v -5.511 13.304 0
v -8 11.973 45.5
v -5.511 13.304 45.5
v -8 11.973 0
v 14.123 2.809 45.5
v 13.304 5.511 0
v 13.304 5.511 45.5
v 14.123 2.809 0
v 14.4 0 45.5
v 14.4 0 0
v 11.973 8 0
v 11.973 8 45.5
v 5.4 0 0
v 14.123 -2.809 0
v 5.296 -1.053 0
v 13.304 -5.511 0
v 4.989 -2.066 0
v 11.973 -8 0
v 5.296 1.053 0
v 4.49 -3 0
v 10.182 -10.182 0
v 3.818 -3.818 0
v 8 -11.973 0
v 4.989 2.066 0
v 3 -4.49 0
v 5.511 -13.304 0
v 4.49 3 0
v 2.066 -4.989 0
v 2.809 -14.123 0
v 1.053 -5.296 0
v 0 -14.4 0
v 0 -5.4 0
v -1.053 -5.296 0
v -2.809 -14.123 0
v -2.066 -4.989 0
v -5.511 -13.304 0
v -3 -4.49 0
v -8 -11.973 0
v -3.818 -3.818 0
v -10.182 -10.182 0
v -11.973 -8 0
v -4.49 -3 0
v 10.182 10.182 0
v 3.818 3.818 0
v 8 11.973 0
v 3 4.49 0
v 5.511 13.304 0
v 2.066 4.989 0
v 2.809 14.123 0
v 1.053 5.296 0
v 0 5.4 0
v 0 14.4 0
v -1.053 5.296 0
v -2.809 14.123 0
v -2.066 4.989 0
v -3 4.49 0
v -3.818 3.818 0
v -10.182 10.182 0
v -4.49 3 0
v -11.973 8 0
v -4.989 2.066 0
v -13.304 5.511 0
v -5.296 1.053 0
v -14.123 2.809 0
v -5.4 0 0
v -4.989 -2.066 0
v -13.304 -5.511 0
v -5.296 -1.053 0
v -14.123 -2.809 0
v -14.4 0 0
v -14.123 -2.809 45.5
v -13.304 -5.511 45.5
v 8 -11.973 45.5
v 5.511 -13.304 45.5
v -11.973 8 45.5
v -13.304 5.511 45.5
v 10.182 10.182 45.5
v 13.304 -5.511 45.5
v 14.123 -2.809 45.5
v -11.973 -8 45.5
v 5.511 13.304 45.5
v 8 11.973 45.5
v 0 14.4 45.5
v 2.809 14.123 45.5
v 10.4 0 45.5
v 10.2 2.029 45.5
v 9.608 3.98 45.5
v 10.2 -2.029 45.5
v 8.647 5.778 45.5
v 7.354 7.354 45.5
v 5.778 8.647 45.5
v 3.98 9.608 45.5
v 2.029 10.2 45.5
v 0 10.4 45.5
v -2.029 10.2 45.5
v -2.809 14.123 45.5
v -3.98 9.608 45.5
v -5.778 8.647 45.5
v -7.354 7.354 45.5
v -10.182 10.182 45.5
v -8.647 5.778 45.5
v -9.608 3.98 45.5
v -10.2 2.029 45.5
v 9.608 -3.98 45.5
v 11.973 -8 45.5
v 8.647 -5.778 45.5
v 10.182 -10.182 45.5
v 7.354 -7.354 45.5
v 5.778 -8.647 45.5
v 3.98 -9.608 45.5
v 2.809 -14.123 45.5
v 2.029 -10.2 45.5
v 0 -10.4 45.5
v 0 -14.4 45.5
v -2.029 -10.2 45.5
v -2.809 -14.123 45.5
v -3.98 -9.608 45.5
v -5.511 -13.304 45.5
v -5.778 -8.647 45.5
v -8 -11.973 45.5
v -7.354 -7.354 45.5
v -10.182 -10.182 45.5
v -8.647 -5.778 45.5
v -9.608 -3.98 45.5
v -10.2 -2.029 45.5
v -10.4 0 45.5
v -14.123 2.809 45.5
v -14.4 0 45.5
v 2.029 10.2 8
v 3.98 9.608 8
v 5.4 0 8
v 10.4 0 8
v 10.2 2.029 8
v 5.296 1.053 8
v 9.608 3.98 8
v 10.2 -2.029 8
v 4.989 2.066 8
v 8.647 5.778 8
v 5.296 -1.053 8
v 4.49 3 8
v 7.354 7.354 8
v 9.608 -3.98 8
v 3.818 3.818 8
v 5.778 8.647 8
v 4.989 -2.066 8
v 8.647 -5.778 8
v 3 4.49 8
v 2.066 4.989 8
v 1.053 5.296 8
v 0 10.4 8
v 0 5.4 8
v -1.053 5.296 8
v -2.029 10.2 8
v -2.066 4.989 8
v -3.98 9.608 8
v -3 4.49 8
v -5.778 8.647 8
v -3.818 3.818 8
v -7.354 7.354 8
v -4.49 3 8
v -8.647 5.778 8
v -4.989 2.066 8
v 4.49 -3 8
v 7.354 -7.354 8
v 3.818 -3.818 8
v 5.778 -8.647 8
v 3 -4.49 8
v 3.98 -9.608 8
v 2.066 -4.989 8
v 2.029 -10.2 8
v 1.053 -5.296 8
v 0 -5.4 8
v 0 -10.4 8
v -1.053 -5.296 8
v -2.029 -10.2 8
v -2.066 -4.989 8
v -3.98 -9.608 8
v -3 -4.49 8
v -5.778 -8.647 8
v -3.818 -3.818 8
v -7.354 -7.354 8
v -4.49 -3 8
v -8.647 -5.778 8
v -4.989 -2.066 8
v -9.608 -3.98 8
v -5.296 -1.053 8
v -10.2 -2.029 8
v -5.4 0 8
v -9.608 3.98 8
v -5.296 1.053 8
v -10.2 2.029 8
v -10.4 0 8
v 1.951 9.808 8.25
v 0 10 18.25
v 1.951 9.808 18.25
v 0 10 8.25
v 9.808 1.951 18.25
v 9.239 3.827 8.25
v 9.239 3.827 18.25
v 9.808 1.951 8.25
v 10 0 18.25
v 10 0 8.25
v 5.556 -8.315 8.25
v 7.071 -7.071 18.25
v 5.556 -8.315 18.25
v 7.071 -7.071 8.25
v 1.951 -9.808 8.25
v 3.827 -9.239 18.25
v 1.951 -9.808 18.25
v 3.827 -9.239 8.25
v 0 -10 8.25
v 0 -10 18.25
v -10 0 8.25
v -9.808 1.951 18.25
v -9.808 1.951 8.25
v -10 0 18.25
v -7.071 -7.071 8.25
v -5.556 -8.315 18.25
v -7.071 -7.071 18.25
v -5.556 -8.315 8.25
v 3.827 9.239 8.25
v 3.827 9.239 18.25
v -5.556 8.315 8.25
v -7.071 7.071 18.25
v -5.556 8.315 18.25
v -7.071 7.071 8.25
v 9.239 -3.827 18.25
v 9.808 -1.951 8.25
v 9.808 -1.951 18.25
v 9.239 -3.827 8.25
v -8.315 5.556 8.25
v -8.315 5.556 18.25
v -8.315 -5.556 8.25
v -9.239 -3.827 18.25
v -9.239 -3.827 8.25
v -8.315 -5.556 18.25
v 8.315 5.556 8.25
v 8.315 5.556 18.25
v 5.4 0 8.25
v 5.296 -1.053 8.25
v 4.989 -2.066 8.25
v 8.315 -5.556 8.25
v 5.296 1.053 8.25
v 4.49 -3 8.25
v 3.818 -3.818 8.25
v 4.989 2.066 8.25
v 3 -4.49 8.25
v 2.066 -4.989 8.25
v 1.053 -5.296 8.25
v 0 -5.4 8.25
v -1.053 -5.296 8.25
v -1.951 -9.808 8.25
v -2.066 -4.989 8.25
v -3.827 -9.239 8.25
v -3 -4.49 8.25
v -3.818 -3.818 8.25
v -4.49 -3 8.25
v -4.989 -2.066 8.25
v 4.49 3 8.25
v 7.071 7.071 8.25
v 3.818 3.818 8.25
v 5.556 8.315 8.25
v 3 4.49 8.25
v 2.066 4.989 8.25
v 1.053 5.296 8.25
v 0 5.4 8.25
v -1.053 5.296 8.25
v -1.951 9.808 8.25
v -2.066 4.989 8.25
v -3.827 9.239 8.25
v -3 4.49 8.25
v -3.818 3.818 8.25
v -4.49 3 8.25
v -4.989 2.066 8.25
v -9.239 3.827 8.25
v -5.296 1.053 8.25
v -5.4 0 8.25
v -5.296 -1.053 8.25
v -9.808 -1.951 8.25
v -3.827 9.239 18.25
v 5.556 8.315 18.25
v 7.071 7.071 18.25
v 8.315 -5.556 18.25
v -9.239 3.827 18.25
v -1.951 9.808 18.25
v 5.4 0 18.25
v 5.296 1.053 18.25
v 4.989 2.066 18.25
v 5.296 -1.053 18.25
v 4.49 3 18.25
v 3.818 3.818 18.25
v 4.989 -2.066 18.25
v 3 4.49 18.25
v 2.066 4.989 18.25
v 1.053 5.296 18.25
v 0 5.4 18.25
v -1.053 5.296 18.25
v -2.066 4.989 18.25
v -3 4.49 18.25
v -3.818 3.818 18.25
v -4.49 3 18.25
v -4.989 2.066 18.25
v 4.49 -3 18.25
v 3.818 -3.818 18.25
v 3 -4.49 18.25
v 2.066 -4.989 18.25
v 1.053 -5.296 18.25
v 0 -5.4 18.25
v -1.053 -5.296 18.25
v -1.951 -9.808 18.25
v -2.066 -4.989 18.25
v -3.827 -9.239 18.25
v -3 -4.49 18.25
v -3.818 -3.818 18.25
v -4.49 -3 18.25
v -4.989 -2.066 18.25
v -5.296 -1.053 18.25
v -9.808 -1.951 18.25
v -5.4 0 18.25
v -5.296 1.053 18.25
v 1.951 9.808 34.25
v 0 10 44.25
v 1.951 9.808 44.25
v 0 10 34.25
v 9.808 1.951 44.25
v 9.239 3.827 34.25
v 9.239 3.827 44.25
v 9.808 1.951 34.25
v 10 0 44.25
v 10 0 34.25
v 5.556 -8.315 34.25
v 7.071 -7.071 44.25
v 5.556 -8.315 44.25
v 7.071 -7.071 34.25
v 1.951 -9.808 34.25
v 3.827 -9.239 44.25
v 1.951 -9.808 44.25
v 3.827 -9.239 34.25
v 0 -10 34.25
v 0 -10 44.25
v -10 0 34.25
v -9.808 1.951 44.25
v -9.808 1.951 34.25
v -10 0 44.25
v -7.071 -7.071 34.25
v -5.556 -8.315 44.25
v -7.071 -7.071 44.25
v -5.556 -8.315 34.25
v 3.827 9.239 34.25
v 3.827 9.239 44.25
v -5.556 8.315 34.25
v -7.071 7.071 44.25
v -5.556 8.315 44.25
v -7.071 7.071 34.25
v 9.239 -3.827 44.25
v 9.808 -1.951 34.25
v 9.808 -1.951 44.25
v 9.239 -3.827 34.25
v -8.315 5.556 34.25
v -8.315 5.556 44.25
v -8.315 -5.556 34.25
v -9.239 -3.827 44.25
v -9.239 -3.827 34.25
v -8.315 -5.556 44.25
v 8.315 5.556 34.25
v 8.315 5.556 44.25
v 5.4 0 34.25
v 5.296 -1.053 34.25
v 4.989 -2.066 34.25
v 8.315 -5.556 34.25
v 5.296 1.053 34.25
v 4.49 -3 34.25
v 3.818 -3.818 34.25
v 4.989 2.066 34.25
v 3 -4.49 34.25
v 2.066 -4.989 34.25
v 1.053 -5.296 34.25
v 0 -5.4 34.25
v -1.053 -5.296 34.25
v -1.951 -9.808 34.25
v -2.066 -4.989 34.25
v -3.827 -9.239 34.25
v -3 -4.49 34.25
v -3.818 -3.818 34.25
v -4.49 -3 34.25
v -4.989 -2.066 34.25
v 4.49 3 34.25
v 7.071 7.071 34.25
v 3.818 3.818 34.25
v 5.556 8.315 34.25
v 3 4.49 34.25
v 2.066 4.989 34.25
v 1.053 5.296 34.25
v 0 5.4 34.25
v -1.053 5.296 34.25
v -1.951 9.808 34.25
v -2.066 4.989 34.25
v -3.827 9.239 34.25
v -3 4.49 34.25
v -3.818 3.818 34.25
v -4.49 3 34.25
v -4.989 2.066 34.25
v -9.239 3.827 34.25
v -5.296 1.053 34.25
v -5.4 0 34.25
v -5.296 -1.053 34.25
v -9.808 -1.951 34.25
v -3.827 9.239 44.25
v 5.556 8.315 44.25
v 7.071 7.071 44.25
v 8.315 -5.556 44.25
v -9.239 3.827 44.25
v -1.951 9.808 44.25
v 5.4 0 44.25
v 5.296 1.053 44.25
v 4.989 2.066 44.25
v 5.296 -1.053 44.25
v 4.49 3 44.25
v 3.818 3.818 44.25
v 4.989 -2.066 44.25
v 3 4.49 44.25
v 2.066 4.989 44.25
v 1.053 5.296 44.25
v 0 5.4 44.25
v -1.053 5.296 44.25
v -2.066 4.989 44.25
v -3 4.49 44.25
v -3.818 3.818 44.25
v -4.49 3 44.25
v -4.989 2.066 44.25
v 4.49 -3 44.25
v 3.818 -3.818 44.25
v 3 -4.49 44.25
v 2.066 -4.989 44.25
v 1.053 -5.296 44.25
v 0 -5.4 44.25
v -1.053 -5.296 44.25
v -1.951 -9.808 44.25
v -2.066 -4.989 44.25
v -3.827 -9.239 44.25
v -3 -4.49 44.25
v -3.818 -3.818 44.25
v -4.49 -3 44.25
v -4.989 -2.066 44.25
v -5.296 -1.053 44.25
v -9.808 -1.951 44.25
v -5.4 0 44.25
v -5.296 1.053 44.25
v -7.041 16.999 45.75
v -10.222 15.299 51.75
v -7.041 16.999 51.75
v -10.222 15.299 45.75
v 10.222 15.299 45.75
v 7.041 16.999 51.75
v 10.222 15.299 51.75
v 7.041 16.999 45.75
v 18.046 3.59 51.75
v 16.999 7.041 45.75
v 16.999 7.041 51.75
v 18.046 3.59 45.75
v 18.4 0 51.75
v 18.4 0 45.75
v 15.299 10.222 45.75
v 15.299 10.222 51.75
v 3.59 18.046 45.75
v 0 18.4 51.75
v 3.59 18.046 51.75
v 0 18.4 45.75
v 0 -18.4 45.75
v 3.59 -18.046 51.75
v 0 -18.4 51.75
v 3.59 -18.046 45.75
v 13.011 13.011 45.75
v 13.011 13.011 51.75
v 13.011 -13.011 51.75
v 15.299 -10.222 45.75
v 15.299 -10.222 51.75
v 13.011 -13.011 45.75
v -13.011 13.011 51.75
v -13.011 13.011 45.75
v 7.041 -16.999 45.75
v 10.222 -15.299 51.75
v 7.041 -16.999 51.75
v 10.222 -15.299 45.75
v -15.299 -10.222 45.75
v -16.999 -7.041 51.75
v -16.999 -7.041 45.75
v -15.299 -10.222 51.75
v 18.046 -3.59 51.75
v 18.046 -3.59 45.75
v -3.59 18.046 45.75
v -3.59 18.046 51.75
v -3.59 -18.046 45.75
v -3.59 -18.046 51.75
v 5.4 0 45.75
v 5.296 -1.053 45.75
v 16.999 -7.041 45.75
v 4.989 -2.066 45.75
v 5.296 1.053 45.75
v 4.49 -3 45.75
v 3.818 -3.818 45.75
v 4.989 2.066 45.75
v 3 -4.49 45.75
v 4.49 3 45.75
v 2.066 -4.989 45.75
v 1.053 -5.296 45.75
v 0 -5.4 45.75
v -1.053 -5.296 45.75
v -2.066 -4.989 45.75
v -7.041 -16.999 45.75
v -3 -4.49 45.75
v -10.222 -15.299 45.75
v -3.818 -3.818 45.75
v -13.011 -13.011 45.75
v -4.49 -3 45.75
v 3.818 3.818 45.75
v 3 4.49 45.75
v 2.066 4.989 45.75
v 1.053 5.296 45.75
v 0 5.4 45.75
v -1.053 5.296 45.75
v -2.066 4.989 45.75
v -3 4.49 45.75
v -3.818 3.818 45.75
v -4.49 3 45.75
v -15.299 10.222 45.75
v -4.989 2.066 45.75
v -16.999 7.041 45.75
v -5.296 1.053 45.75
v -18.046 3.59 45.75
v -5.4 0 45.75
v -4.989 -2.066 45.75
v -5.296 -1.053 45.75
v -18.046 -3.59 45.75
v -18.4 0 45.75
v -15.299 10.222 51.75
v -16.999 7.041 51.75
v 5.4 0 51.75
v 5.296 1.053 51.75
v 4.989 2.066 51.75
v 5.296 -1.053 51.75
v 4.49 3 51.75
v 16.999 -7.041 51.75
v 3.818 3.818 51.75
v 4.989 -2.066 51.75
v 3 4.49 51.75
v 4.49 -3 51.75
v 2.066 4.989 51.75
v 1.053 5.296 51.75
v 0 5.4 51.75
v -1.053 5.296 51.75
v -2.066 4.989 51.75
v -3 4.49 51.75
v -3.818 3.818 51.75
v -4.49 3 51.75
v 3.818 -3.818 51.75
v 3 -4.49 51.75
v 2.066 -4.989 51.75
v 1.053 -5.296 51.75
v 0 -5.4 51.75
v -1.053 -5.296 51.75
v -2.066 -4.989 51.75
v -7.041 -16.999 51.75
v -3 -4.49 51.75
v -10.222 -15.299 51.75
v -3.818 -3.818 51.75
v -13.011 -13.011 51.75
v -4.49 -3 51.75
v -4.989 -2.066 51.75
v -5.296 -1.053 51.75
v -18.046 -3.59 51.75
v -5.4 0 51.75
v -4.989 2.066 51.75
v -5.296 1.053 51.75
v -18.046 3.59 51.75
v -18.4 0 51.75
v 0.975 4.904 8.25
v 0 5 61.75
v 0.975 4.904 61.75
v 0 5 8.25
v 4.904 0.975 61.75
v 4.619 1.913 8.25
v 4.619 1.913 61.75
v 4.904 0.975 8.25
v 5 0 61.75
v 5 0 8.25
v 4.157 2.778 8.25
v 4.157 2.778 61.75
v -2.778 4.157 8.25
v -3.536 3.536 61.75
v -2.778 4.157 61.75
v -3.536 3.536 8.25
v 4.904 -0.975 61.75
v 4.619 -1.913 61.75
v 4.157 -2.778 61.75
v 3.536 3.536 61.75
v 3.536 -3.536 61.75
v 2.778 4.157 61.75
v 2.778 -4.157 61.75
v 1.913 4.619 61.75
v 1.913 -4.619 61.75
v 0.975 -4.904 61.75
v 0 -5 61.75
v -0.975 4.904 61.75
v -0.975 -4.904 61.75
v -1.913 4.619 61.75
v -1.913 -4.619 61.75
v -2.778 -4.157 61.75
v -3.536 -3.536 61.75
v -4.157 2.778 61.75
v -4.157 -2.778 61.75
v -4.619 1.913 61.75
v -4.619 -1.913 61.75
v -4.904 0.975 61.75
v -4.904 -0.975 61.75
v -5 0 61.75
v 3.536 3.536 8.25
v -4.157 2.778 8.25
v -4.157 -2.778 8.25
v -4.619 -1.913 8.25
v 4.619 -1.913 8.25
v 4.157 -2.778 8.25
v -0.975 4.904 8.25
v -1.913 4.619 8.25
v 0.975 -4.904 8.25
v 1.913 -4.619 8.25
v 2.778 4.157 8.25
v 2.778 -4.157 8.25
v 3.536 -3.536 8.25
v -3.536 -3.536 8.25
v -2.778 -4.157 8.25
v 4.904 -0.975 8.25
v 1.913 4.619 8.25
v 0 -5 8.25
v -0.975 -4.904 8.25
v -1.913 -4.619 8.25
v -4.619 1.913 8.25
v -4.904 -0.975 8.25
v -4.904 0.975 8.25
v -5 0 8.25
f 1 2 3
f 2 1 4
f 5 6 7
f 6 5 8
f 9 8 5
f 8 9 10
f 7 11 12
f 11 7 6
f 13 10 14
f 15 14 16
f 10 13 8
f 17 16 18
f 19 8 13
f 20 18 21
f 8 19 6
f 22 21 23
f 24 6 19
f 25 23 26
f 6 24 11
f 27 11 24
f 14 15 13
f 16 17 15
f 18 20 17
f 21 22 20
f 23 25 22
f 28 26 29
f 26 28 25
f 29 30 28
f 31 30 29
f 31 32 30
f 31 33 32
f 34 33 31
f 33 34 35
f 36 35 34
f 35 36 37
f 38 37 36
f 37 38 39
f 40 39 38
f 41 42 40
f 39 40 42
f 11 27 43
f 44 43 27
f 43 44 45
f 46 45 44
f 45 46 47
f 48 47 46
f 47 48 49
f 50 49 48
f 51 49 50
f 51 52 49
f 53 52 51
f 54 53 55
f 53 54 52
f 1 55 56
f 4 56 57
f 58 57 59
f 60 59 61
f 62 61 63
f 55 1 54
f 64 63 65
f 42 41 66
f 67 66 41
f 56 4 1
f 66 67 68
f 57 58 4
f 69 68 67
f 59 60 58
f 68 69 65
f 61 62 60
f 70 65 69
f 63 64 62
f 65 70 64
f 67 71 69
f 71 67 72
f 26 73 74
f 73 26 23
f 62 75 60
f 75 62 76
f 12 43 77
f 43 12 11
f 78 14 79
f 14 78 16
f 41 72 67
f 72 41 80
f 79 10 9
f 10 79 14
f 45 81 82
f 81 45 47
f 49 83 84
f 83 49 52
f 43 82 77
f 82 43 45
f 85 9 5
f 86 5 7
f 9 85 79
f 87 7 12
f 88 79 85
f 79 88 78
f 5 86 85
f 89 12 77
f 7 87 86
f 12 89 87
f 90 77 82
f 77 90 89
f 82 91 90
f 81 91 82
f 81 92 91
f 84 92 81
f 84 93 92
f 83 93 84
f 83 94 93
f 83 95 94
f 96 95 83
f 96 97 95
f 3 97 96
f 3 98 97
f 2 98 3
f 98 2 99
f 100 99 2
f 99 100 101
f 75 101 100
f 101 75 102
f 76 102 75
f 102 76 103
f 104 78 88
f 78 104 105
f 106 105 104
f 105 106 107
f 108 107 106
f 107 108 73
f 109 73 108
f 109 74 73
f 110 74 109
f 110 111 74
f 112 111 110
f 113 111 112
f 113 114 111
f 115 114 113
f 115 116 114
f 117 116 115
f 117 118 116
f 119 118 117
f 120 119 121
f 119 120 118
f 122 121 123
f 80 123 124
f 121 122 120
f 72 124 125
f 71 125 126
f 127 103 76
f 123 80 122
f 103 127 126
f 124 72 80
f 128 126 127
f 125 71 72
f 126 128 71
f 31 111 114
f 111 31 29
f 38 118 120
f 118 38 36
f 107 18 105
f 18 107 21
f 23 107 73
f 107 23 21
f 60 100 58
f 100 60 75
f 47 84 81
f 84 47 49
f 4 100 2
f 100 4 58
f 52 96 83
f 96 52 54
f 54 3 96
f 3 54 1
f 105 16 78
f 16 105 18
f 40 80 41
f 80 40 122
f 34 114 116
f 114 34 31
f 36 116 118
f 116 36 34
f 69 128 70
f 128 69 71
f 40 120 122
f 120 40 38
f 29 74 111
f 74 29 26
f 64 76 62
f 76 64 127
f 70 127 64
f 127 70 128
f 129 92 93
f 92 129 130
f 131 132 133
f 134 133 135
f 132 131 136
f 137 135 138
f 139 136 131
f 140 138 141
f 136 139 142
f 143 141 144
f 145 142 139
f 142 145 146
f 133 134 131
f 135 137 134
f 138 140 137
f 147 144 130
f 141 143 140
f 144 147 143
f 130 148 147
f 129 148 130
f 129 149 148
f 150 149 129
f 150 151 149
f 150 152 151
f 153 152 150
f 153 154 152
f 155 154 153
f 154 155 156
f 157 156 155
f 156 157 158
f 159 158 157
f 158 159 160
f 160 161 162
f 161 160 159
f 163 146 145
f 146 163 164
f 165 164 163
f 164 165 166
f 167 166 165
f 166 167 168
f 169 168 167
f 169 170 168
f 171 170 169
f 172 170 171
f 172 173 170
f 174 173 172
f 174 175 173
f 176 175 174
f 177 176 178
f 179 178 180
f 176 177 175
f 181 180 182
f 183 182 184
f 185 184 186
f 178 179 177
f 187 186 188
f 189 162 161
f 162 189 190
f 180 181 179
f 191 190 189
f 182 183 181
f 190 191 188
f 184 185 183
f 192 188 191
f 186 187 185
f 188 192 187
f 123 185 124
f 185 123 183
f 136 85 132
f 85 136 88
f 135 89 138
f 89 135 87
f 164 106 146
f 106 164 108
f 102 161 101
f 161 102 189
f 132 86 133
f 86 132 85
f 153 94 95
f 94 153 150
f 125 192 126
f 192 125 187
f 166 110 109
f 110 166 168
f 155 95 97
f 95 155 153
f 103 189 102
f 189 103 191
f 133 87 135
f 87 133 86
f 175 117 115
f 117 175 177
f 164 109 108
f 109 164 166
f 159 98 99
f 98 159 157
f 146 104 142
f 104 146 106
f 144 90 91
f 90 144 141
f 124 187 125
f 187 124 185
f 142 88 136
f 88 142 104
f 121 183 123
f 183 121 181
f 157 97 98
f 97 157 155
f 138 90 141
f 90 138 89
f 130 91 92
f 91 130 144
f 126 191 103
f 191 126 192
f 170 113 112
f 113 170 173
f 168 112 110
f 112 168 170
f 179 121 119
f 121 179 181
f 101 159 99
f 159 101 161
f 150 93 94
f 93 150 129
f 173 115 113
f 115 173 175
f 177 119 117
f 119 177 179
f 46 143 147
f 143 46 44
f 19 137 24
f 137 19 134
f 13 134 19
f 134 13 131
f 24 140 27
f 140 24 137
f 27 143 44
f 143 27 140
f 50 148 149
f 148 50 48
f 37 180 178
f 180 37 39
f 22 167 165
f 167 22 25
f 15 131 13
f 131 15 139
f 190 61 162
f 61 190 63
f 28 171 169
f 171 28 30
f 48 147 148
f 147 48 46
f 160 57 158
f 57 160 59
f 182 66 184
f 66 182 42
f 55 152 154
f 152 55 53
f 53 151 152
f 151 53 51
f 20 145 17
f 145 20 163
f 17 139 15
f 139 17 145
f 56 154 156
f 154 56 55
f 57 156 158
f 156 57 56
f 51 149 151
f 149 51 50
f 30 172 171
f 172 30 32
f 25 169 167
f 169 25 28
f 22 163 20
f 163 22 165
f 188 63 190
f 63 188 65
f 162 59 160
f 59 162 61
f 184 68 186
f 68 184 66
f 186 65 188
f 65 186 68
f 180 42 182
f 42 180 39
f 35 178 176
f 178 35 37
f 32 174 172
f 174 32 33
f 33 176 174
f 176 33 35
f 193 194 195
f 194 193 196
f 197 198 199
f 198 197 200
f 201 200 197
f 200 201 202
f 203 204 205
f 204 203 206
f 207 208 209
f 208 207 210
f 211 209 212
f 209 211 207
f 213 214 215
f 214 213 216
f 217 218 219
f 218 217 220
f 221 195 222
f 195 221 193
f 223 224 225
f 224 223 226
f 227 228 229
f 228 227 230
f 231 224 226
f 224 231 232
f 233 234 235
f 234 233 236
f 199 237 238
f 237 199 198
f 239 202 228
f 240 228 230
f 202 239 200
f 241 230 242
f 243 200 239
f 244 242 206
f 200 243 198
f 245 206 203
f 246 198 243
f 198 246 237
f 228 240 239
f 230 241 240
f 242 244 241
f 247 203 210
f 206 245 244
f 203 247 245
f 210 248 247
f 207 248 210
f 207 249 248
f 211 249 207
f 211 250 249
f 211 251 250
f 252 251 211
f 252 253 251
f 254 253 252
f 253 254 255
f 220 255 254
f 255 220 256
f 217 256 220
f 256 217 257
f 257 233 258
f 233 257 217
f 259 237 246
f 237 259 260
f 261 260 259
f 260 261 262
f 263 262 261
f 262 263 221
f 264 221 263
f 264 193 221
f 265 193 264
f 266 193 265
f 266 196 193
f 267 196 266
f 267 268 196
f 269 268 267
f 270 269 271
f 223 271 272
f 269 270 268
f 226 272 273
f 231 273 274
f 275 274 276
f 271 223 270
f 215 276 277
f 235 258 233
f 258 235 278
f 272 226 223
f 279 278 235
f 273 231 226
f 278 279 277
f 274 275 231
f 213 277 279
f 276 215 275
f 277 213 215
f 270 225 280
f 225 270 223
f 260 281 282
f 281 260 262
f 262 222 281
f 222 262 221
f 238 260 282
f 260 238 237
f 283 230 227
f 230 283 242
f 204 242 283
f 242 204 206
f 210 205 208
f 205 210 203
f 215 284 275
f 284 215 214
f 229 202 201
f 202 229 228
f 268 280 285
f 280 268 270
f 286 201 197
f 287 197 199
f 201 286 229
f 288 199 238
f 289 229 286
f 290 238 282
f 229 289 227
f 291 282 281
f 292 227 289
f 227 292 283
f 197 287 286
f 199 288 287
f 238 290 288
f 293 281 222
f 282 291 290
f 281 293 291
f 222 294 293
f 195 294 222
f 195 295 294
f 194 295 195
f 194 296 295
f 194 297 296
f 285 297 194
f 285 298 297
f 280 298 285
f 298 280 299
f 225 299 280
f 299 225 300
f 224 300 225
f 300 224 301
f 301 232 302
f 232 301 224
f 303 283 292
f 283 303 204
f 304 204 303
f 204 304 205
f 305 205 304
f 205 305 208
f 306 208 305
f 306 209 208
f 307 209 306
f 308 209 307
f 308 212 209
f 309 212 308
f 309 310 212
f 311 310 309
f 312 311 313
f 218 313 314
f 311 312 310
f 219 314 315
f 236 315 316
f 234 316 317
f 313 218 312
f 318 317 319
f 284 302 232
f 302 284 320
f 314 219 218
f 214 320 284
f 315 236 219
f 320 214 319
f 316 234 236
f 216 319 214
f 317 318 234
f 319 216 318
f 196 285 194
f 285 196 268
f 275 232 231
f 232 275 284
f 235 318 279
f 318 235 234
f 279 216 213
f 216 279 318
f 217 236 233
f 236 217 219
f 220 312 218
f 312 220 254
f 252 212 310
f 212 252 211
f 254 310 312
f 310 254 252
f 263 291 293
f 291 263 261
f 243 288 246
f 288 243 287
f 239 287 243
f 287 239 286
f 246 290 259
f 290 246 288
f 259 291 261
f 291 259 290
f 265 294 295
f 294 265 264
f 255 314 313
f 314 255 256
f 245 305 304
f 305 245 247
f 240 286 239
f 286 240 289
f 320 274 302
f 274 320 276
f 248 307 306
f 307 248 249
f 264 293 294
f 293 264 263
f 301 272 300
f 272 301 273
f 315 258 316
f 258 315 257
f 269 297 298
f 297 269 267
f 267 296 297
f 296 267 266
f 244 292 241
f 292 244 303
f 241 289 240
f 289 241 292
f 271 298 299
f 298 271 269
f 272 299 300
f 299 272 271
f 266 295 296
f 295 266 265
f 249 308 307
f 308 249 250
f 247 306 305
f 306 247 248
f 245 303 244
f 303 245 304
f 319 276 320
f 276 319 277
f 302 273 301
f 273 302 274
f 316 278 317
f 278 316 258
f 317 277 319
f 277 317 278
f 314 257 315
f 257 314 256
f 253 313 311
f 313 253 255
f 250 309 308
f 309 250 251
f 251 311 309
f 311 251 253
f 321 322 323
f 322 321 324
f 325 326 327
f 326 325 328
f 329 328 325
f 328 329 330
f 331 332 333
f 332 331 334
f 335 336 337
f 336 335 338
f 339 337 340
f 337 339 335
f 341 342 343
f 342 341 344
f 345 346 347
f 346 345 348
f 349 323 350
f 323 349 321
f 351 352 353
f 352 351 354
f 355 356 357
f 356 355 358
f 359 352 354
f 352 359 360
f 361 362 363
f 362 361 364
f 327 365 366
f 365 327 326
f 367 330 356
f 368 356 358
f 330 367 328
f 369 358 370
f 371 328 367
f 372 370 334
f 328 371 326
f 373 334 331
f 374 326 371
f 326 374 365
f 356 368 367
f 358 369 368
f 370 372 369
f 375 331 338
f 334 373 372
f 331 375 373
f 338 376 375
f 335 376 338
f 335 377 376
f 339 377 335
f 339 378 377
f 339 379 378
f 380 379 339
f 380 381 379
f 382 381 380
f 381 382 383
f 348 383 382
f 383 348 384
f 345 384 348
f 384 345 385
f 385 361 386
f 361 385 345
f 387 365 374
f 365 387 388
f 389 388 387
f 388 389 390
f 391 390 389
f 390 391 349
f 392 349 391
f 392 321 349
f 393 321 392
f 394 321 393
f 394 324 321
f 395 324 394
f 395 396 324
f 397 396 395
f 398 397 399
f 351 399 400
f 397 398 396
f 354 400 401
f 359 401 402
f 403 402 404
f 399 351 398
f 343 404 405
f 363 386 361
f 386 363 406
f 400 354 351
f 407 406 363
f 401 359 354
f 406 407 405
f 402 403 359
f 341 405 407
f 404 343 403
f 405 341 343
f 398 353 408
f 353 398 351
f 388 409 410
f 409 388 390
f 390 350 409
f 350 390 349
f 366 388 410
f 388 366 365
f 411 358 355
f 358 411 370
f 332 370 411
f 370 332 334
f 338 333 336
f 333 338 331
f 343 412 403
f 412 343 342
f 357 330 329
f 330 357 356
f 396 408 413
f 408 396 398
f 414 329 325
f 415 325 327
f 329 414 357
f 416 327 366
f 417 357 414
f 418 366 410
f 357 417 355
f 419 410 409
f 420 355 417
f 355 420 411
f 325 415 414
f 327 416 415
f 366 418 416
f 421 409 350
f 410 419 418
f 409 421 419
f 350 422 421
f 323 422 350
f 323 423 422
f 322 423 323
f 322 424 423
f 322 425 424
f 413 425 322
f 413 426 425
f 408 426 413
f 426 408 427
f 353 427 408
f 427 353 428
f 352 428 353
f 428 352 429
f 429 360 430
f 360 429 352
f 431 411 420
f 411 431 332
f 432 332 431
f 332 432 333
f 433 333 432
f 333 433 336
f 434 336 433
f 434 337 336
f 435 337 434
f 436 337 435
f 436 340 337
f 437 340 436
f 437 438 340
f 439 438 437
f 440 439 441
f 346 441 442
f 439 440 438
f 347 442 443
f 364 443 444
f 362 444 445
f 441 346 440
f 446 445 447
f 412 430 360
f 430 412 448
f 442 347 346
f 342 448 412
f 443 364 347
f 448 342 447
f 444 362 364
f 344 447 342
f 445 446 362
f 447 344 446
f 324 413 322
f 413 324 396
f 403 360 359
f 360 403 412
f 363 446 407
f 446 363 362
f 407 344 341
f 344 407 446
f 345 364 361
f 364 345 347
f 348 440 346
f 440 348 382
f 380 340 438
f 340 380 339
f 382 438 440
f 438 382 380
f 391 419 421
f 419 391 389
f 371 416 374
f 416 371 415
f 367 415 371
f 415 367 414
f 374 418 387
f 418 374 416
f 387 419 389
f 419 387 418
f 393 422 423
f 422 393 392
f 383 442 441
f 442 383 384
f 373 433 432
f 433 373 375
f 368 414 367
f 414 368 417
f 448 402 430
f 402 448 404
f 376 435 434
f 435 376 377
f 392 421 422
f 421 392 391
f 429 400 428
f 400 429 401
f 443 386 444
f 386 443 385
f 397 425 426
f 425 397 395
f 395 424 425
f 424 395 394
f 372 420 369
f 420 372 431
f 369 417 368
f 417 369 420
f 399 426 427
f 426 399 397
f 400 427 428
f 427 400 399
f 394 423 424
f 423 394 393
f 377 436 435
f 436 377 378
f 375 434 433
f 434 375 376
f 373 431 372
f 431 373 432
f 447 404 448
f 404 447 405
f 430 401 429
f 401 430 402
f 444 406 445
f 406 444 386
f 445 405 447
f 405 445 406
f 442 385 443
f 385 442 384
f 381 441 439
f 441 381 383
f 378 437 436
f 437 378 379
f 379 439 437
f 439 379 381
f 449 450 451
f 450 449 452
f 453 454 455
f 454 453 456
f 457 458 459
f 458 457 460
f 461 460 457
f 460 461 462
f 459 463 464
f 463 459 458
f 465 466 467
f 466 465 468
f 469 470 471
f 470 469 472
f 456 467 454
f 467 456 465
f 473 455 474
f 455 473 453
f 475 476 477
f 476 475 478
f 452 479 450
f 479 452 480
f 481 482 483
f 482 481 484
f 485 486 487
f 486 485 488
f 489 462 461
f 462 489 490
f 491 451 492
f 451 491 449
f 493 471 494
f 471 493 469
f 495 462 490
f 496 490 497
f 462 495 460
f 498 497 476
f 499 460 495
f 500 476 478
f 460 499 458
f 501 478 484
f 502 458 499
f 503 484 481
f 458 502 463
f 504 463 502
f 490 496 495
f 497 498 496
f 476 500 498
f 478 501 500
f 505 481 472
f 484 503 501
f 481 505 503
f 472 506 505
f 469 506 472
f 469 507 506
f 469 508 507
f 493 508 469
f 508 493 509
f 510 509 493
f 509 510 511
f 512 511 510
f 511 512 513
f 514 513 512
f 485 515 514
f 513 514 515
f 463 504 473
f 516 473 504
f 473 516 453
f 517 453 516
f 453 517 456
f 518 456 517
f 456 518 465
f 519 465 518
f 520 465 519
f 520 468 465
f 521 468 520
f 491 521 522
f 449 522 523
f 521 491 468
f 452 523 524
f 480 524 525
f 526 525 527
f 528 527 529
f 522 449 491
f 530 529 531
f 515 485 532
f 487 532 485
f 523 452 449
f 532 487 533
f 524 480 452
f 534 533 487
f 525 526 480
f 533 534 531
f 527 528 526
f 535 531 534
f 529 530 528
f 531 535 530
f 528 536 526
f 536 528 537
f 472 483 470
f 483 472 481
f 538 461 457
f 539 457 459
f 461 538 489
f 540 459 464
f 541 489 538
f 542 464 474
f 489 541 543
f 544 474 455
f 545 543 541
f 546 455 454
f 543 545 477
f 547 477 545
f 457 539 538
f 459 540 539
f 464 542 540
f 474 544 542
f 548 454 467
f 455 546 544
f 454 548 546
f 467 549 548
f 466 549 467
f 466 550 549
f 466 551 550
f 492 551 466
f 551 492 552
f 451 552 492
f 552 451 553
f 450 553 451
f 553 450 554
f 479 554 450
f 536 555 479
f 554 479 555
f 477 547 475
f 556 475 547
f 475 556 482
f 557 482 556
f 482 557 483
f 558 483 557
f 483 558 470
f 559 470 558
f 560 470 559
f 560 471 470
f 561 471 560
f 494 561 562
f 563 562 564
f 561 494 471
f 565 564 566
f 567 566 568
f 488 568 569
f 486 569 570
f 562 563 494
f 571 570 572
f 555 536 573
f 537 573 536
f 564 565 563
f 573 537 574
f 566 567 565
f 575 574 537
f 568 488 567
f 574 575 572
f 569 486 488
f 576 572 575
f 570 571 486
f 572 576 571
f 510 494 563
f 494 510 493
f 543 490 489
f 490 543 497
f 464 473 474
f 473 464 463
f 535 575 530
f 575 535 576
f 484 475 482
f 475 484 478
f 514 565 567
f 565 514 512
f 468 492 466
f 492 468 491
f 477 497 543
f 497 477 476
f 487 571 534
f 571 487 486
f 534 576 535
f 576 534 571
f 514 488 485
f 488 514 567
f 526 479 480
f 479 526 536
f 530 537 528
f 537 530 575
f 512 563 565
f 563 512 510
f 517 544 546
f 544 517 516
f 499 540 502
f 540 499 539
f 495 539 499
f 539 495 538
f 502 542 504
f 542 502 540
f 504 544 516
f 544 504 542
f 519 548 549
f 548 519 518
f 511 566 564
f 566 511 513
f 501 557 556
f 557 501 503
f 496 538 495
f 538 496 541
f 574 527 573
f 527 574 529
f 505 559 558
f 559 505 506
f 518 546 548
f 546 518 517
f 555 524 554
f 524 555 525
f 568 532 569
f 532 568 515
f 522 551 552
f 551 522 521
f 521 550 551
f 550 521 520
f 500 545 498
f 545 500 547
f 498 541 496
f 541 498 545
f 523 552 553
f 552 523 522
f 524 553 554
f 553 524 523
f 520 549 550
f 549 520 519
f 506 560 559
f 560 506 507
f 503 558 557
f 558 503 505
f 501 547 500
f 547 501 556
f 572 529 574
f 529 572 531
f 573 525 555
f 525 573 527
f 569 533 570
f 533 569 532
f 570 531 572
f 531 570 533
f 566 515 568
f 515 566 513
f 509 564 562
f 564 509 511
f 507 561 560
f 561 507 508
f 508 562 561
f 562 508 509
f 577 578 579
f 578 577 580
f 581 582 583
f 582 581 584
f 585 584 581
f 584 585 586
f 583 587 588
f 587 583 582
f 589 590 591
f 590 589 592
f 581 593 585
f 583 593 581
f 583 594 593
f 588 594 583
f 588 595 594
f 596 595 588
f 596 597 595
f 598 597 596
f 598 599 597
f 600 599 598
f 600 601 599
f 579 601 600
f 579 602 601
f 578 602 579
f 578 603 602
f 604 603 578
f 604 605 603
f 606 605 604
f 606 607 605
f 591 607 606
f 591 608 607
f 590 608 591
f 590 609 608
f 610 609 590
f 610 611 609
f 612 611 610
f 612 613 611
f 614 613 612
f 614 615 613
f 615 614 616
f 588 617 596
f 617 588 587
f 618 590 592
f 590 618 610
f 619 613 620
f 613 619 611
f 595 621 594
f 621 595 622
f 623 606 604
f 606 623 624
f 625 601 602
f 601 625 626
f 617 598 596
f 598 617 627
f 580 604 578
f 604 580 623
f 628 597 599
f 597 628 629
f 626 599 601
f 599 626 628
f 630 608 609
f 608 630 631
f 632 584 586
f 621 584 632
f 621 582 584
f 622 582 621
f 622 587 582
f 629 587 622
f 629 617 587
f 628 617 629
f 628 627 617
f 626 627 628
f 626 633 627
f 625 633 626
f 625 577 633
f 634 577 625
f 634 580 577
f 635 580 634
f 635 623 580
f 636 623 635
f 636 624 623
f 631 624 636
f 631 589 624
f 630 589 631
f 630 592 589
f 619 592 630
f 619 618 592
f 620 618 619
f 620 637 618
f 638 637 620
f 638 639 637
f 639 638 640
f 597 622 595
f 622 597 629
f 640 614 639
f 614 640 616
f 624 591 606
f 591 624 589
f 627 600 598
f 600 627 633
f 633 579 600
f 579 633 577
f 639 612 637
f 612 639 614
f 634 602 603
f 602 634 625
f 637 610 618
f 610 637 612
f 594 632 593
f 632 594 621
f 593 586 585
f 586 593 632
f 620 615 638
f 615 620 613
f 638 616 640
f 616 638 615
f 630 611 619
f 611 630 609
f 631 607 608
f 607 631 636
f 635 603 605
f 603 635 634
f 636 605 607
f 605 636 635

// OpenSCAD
$fn = 32;

// ------------------------------------------------------------------------
// Shaft station: cup d28.8 x 45.5 mm, shaft d10
// Every part is its own module, assembly() places every instance.
// ------------------------------------------------------------------------

// --- part 1 ---
module housing_cup() {
  difference() {
    cylinder(h = 45.5, d = 28.8);
    translate([0, 0, 8]) cylinder(h = 38.5, d = 20.8);
    translate([0, 0, -1]) cylinder(h = 10, d = 10.8);
  }
}

// --- part 2 ---
module bearing_lower() {
  difference() {
      translate([0, 0, 0]) cylinder(h = 10, d = 20);
      translate([0, 0, -1]) cylinder(h = 12, d = 10.8);
    }
}

// --- part 3 ---
module bearing_upper() {
  difference() {
      translate([0, 0, 0]) cylinder(h = 10, d = 20);
      translate([0, 0, -1]) cylinder(h = 12, d = 10.8);
    }
}

// --- part 4 ---
module station_shaft() {
  translate([0, 0, -26.75]) cylinder(h = 53.5, d = 10);
}

// --- part 5 ---
module station_cover() {
  difference() {
    cylinder(h = 6, d = 36.8);
    translate([0, 0, -1]) cylinder(h = 8, d = 10.8);
  }
}

// --- assembly ---
module assembly() {
  color([0.80, 0.24, 0.20]) translate([0, 0, 0]) rotate([0, 0, 0]) housing_cup();
  color([0.20, 0.45, 0.75]) translate([0, 0, 8.25]) rotate([0, 0, 0]) bearing_lower();
  color([0.25, 0.62, 0.32]) translate([0, 0, 34.25]) rotate([0, 0, 0]) bearing_upper();
  color([0.92, 0.70, 0.18]) translate([0, 0, 35]) rotate([0, 0, 0]) station_shaft();
  color([0.58, 0.35, 0.70]) translate([0, 0, 45.75]) rotate([0, 0, 0]) station_cover();
}

assembly();
